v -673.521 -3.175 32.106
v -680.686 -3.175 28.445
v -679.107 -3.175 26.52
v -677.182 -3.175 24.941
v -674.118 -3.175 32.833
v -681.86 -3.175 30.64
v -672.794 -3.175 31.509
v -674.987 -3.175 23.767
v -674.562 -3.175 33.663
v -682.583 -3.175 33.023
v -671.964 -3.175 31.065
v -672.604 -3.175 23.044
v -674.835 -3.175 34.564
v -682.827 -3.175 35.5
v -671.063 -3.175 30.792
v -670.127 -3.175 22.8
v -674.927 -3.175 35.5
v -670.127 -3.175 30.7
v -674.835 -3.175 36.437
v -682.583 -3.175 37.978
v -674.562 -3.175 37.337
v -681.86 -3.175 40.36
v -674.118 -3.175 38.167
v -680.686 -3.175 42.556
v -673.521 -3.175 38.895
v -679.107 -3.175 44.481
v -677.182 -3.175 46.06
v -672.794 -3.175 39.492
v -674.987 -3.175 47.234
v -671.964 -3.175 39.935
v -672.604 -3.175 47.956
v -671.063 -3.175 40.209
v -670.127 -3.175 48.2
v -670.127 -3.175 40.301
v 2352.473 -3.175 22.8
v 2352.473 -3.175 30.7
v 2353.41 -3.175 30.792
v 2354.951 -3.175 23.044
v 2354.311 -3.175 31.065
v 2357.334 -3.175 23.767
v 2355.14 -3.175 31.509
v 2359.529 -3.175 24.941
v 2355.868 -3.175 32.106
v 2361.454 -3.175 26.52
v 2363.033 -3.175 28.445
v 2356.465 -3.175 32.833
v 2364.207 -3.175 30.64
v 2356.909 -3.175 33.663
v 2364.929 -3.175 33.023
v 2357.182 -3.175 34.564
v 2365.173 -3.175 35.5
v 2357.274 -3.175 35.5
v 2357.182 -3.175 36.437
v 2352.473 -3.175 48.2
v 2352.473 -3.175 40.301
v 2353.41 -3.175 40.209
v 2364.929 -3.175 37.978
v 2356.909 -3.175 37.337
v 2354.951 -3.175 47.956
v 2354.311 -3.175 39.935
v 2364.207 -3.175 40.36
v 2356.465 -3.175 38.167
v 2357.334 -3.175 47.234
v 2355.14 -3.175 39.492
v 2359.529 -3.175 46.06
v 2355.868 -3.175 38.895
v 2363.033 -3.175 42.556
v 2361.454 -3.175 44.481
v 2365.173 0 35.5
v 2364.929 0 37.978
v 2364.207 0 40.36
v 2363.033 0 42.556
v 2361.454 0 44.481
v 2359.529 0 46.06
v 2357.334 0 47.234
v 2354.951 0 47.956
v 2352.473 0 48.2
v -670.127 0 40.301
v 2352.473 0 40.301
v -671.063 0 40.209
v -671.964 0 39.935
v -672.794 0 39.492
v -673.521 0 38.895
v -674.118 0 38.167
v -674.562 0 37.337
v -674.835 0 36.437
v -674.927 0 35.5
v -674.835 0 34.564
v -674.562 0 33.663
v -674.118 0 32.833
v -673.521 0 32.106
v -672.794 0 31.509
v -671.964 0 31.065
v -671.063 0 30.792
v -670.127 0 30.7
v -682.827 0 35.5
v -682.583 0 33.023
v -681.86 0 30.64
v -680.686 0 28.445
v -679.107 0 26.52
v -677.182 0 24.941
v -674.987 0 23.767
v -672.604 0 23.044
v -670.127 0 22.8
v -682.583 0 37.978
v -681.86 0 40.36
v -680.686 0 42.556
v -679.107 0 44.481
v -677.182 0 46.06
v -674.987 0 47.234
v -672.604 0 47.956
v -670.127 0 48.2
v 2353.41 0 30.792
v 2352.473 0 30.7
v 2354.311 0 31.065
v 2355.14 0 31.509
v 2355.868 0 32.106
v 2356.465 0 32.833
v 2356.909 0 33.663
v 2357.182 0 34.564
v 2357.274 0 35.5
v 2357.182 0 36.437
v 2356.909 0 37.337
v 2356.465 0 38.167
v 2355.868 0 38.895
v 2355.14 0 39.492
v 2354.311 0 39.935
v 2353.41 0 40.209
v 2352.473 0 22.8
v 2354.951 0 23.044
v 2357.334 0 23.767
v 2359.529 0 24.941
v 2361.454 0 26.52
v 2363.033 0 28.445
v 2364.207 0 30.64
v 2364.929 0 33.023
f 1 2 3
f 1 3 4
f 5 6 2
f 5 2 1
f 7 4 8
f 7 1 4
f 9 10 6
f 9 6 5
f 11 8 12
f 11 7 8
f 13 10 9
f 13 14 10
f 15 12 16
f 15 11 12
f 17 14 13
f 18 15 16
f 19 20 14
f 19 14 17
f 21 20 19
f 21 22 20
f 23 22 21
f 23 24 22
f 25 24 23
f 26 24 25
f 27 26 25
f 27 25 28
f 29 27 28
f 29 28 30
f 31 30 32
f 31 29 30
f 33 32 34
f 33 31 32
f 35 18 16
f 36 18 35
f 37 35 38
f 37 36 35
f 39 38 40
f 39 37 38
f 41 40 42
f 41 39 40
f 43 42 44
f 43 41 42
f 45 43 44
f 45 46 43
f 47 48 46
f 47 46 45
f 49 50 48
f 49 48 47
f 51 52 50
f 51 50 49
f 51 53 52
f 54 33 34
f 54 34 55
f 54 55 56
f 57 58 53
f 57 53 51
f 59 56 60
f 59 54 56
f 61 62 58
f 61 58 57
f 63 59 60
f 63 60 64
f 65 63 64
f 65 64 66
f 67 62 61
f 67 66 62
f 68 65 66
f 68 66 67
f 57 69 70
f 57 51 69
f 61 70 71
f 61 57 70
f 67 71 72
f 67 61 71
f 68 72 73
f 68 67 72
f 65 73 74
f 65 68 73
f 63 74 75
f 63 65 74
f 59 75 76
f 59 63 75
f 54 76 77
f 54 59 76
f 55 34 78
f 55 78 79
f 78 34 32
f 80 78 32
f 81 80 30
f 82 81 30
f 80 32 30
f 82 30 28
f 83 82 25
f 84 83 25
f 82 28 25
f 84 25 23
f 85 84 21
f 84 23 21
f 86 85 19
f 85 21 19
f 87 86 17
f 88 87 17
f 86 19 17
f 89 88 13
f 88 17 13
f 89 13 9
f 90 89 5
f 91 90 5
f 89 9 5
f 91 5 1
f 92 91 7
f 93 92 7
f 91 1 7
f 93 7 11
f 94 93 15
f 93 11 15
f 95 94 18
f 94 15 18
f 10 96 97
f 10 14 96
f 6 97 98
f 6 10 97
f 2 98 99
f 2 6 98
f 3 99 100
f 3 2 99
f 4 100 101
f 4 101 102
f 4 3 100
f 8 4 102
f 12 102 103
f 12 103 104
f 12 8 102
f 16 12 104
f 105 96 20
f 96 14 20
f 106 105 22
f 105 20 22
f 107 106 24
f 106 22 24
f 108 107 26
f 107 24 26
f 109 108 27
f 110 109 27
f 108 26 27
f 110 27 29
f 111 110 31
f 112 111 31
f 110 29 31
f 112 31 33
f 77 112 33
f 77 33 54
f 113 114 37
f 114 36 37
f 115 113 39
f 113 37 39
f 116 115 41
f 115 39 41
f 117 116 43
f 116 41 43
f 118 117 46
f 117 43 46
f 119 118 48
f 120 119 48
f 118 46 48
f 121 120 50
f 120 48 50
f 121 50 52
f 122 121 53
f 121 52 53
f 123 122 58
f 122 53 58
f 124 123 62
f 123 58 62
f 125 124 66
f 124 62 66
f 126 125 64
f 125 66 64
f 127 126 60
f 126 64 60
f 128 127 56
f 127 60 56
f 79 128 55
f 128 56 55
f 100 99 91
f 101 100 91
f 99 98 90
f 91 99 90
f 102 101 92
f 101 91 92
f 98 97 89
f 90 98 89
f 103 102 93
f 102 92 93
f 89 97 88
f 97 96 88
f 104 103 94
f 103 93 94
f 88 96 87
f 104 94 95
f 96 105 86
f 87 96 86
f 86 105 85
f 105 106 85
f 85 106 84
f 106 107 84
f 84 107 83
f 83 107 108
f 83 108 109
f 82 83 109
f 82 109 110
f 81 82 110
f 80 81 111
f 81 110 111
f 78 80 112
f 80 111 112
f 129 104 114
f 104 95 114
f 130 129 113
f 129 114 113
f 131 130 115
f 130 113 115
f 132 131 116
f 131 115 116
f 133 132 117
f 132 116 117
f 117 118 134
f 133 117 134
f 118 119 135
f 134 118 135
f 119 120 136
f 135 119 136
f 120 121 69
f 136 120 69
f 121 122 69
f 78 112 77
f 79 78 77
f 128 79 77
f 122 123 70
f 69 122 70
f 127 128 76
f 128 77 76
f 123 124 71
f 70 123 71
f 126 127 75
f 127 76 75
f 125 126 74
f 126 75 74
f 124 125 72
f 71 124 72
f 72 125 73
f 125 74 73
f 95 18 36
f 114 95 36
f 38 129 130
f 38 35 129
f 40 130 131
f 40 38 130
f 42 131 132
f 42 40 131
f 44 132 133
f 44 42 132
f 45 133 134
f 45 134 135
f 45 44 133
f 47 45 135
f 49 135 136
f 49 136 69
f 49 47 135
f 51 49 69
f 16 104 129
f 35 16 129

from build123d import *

# Parameters (mm, degrees)
F0_W     = 3048
F0_H     = 25.4
F1_DEPTH = 3.175
F2_R     = 12.69999
F3_R     = 4.8006
F4_DEPTH = 3.175
F5_W     = 3022.6
F5_H     = 9.6012
F6_DEPTH = 25.4


# Not quite as in the source:
# - a fillet or chamfer is up to 0.001 mm smaller than in the source, because OpenCascade refuses the exact size


with BuildPart() as f1:
    # F0 (on Front) → F1 (new body)
    with BuildSketch(Plane.XZ):
        with Locations((841.1734242707, 35.5002675663)):
            Rectangle(F0_W, F0_H)
    extrude(amount=F1_DEPTH)

    # F2 (radius 12.7 in the source; OpenCascade refuses exactly that, so slightly less here)
    f2_edges = [f1.edges().sort_by_distance(p)[0] for p in [
        (2365.173424, -1.5875, 48.200268),
        (2365.173424, -1.5875, 22.800268),
        (-682.826576, -1.5875, 48.200268),
        (-682.826576, -1.5875, 22.800268),
    ]]
    fillet(f2_edges, radius=F2_R)

    # F3 (on face) → F4 (cut)
    with BuildSketch(Plane.XZ.offset(3.175)):
        with Locations((-670.1265757293, 35.5002675663)):
            Circle(F3_R)
        with Locations((2352.4734242707, 35.5002675663)):
            Circle(F3_R)
    extrude(amount=-F4_DEPTH, mode=Mode.SUBTRACT)

    # F5 (on face) → F6 (cut)
    with BuildSketch(Plane.XZ.offset(3.175)):
        with Locations((841.1734242707, 35.5002675663)):
            Rectangle(F5_W, F5_H)
    extrude(amount=-F6_DEPTH, mode=Mode.SUBTRACT)


solid = f1.part
